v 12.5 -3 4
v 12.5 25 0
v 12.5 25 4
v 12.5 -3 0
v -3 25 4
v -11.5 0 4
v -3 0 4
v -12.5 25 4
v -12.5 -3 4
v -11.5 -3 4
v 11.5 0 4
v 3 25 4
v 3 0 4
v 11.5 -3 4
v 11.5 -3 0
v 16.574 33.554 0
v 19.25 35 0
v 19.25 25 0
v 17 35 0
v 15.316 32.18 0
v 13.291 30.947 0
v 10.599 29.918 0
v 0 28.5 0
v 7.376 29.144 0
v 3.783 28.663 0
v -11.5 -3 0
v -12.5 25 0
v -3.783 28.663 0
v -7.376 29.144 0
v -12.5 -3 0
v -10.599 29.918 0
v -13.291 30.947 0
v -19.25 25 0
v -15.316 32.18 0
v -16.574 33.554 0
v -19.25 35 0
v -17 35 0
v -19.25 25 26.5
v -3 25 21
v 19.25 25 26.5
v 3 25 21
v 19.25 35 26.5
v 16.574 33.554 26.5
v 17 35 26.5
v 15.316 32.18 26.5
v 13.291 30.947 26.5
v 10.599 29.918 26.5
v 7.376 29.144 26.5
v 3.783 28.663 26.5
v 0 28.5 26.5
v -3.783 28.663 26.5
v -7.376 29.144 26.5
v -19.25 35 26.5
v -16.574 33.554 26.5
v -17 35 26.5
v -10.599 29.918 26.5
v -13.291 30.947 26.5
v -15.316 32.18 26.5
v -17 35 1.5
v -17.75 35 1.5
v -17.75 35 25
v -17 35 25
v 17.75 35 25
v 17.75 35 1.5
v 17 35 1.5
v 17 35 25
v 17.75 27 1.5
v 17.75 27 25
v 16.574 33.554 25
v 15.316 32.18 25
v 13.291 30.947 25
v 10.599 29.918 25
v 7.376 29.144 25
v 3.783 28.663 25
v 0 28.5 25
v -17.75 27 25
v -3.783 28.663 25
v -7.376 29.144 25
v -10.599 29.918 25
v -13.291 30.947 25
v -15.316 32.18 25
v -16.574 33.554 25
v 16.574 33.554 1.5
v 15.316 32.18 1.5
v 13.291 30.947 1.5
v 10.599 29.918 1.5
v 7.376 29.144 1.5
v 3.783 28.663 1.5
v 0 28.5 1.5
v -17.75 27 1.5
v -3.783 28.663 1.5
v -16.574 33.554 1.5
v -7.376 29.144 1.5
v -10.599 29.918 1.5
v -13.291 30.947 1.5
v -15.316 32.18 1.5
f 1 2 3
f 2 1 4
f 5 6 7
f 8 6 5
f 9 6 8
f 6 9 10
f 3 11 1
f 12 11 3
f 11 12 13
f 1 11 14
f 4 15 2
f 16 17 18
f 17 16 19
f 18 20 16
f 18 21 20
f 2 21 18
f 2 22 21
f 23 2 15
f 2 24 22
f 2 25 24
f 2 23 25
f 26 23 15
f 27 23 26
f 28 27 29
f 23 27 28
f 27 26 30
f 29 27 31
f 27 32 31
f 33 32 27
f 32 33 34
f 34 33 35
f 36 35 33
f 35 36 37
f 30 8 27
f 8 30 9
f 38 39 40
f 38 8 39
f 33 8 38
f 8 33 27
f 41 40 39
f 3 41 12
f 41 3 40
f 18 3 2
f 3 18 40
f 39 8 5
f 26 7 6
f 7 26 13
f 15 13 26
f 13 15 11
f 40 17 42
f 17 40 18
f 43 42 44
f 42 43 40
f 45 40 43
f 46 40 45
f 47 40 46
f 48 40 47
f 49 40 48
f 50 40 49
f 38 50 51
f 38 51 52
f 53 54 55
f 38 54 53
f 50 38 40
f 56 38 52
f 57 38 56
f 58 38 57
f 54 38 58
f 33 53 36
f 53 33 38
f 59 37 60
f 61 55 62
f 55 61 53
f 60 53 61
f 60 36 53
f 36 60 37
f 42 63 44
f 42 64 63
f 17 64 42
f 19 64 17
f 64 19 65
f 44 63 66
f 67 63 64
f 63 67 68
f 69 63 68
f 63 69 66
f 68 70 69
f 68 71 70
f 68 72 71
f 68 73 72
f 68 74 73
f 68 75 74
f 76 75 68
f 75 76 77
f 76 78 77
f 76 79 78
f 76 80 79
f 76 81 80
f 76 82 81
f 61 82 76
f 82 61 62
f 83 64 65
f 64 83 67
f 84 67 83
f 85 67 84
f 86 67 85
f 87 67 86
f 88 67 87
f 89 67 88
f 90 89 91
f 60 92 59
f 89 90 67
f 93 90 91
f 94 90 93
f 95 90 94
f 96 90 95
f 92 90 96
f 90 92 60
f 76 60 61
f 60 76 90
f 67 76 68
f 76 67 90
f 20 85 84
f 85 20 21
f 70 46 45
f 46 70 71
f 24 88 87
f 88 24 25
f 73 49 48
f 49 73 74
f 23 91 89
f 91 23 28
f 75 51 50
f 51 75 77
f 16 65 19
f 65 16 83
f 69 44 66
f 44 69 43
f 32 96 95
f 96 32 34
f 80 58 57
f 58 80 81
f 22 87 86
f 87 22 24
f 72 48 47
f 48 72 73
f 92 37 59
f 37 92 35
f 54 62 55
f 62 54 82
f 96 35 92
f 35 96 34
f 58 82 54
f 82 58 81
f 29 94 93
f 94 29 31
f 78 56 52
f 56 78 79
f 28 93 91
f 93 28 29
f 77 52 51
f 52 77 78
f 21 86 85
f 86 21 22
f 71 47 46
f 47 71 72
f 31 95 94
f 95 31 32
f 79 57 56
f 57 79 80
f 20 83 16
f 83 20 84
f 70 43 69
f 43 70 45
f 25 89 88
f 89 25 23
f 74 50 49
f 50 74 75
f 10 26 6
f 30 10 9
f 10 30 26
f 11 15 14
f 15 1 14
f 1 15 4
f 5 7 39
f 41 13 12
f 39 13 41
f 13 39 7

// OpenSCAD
// preview[view:north west, tilt:top diagonal]

//the width of the new stone
stone_w = 35;//[10:60]

//height of the new stone
stone_h = 23;//[5:60]

//new stone length
stone_l = 98;//[40:148]

//original (old) stone length
original_stone_l = 158;//[120:170]

//Cutout
cut = 1; //[1:On,2:Off]


dist = (original_stone_l - stone_l)/2 - 3 - 2;

translate ([-25 / 2, 0, 0]) {cube ([25, dist, 4], 0);

rotate ([0, 270, 180]){ 
    linear_extrude(height = 25, center = 0, convexity = 10, twist = 0) polygon(points=[[0,0],[4,0],[0,3]],center = 0);
    }
}

translate ([-25/2, -3, 0]) cube ([1, 3, 4],0);
translate ([-25/2+24, -3, 0]) cube ([1, 3, 4],0);

difference (){
    
    translate ([- ((stone_w + 3.5) / 2), dist, 0]) {
        cube ([stone_w + 3.5, 10, stone_h + 3.5],0);
    }
    
    translate ([- (stone_w + 0.5 ) / 2, dist + 2, 1.5]) {
        cube ([stone_w + 0.5, 10, stone_h + 0.5 ],0);
    }
    
    if (cut == 1){
        translate ([0, dist + 10, -1]) resize([stone_w - 1, 13, 0]) {
            cylinder(stone_h + 5, d = stone_w / 2 );
        }
    }
}

rotate ([0, 270, 180]) translate([4, - dist, - 3]){ 
    linear_extrude(height = 6, center = 0, convexity = 10, twist = 0) polygon(points=[[0,0],[stone_h - 6, 0],[0, dist]], center=0);
}
